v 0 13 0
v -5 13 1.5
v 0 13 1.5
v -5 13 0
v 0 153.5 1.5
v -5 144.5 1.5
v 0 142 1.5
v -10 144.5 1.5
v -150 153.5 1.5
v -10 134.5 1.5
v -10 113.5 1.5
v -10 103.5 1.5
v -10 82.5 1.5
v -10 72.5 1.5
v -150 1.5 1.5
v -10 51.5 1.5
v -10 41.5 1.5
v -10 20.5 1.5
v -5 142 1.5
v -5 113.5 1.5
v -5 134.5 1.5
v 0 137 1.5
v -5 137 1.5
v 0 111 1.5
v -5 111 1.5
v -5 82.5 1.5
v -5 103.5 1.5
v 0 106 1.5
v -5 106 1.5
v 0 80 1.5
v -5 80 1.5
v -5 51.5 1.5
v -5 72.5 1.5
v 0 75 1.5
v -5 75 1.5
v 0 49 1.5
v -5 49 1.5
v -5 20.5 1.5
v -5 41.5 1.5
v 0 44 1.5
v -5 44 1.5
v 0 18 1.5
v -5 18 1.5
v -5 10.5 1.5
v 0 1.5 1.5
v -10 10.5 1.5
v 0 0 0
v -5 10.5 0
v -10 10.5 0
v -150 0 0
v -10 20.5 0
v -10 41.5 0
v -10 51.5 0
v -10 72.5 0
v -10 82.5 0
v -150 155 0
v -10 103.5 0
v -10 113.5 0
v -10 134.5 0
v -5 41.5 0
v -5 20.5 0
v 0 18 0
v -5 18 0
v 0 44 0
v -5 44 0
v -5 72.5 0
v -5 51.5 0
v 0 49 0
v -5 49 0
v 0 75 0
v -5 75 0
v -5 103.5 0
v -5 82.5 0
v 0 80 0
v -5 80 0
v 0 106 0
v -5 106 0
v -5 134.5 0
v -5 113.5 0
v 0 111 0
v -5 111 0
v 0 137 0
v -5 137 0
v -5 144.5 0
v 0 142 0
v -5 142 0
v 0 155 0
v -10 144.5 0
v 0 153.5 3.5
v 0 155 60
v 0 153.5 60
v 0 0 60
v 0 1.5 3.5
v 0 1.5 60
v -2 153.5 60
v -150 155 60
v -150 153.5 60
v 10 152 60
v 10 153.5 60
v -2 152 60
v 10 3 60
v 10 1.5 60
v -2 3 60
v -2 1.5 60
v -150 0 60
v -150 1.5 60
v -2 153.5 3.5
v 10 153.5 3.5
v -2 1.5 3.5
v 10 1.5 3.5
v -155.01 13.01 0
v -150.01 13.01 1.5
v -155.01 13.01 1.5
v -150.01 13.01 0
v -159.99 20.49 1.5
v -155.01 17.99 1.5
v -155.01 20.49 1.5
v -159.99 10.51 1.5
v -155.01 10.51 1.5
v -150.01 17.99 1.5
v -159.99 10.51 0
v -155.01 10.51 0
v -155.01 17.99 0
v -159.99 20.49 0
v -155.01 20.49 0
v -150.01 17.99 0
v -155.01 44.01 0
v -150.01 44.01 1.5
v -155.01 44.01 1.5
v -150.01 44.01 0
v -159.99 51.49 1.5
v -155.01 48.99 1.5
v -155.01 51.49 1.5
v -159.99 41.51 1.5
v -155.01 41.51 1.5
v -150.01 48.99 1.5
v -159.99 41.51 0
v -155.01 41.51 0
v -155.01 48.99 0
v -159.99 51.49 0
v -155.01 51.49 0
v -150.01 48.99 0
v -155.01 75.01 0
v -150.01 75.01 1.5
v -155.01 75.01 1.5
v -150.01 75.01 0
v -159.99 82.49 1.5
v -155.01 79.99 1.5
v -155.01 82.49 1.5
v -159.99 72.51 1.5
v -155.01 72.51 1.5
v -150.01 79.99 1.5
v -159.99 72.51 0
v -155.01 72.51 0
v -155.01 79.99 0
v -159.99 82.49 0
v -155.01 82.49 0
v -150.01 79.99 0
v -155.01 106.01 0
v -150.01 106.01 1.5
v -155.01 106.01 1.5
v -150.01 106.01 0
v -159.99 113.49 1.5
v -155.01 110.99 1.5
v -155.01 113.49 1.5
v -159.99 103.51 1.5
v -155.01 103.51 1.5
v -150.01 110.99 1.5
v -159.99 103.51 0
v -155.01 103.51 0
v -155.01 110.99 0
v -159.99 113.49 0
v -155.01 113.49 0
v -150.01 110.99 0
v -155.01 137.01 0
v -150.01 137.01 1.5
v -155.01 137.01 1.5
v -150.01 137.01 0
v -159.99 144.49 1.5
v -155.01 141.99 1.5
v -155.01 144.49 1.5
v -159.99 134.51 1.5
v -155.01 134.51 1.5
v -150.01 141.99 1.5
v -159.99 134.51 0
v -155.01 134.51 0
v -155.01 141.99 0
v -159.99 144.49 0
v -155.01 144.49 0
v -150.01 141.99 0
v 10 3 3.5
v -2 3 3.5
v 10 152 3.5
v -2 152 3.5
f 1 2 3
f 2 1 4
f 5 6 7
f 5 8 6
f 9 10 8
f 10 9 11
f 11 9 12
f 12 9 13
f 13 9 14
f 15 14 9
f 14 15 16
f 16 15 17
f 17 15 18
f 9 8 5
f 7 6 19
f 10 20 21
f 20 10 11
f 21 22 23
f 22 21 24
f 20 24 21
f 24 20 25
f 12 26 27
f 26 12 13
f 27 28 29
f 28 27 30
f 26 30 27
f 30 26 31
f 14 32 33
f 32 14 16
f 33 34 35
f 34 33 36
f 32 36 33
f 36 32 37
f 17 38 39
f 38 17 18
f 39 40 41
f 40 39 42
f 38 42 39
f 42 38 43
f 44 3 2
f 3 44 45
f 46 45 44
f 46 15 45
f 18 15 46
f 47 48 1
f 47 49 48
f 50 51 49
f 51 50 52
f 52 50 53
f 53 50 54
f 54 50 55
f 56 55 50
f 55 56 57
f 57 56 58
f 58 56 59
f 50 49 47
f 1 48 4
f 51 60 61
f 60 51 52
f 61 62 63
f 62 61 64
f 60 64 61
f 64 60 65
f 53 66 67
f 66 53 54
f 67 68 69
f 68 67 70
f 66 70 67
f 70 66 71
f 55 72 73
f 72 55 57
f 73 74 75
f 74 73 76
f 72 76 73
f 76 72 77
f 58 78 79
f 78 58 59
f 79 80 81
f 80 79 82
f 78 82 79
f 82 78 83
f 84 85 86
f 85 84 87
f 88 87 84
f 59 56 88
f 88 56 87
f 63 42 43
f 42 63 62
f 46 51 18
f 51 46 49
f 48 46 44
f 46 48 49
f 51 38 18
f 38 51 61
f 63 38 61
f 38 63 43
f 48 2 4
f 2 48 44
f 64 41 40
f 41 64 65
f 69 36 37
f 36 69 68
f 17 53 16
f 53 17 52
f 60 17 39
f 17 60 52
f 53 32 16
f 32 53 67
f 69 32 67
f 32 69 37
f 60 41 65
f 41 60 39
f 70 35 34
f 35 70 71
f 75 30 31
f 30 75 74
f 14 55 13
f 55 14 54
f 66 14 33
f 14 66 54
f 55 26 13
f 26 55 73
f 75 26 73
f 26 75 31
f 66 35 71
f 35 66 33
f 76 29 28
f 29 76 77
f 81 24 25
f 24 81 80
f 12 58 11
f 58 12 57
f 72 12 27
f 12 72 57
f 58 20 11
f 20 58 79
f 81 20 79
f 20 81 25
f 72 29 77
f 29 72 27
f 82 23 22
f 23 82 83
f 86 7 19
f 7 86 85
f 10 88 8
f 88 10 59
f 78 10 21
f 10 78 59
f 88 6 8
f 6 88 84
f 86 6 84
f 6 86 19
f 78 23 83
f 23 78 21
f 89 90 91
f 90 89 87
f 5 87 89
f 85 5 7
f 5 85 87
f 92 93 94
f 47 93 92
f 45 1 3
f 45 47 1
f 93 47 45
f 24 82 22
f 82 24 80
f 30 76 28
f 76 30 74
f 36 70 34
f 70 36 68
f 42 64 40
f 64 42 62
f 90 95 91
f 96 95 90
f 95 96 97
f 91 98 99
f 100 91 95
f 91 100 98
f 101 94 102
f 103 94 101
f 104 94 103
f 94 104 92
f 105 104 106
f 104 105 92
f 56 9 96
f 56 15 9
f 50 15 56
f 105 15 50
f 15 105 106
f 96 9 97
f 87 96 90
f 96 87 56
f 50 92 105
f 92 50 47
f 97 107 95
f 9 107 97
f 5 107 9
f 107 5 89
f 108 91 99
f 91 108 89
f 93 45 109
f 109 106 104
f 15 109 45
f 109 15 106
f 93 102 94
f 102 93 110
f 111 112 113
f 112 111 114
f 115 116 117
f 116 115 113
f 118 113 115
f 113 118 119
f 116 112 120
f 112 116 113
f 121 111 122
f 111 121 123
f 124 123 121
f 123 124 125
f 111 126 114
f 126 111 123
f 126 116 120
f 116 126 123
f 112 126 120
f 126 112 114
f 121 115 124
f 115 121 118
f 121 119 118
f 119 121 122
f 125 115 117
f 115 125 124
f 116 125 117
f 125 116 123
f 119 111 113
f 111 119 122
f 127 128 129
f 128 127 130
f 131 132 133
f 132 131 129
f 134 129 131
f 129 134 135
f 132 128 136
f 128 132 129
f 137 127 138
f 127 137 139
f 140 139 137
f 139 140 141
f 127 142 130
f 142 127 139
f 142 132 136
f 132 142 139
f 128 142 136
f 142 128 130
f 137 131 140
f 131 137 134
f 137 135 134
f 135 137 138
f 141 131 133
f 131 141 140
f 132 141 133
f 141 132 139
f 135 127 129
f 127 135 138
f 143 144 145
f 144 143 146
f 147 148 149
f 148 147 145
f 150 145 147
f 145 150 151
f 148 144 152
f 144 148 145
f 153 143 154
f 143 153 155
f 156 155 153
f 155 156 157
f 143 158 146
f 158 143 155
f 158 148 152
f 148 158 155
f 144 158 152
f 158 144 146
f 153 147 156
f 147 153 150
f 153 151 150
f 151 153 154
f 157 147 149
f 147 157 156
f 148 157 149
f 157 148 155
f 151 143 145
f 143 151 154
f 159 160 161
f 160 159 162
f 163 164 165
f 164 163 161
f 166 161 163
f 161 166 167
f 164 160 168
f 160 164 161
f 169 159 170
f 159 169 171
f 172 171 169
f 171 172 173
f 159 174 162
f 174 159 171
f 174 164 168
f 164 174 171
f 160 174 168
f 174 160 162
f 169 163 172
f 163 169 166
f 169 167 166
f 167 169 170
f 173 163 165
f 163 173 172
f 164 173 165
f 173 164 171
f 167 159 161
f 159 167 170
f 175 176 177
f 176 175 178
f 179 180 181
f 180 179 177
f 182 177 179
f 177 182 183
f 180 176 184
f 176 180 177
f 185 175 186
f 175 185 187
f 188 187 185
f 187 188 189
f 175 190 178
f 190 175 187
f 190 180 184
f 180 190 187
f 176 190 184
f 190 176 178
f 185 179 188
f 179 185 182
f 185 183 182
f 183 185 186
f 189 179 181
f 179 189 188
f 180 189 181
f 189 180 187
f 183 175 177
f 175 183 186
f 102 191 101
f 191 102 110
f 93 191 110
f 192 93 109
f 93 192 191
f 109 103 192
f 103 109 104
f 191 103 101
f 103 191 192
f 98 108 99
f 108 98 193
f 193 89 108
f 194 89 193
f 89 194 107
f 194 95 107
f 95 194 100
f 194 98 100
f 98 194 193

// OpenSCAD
$fn = 100;

bottomThickness = 1.5;
wallThickness = 1.5;


screwRadiusM3 = 1.45;
screwRadiusM4 = 1.75;
screwRadiusM3Smooth = 1.6;
smoothRodRadius = 8.2/2;


axisSectionDepth = 40;

boxWidth = 150;
boxDepth = 195 - axisSectionDepth;
boxHeight = 60;

//endBox();
//translate([-boxWidth - 20, 0, 0])
box();

//translate([-boxWidth * 2 - 40, 0, 0])
//otherEndBox();

//motorMount();
//translate([0, 50, 0])
//otherMount();





module box(addConnectFlaps = true) {
    hookWidth = 10;
    hookDepth = 10;
    
    hookCount = 5;
    
    translate([-boxWidth, 0, 0])
    difference() 
    {
        cube([boxWidth, boxDepth, boxHeight]);
        translate([0, wallThickness, bottomThickness])
        cube([boxWidth, boxDepth - wallThickness * 2, boxHeight - bottomThickness]);
        
        for (i=[0:hookCount - 1]) {
            x = boxDepth / hookCount * (i + .5);
            translate([boxWidth - hookWidth, x, 0])
            rotate([0, 0, -90])
            hook(hookWidth, hookDepth + 1, 5, 0);
        }
    }
    
    for (i=[0:hookCount - 1]) {
        x = boxDepth / hookCount * (i + .5);
        translate([-boxWidth - hookWidth, x, 0])
        rotate([0, 0, -90])
        hook(hookWidth, hookDepth, 5);
    }
    
    if (addConnectFlaps) {
        
        overlapWidth = 10;
        overlapVerticalOffset = 2;
        translate([-2, wallThickness, bottomThickness + overlapVerticalOffset]) {
            cube([overlapWidth + 2, wallThickness, boxHeight - bottomThickness - overlapVerticalOffset]);
        
            translate([0, boxDepth - wallThickness * 3, 0])
            cube([overlapWidth + 2, wallThickness, boxHeight - bottomThickness - overlapVerticalOffset]);
        }
    }
}






module endBox() { // boxWidth = 50;
    box(addConnectFlaps=false);
    translate([-wallThickness, 0, 0])
    cube([wallThickness, boxDepth, boxHeight]);
    translate([-boxWidth / 2, 0, 0])
    cube([boxWidth / 2, boxDepth, bottomThickness]);
    
    translate([0, 0, bottomThickness])
    motorMount();
    translate([-3, -axisSectionDepth, 0])
    cube([15 + 3, boxDepth + axisSectionDepth, bottomThickness]);
}



module otherEndBox() {
    difference() {
        box(addConnectFlaps=true);
        translate([-boxWidth * 2, 0, 0])
        cube([boxWidth, boxDepth, boxHeight]);
    }
    translate([-boxWidth, 0, 0])
    cube([wallThickness, boxDepth, boxHeight]);

    
    translate([-boxWidth+3, 0, bottomThickness])
    otherMount();
    translate([-boxWidth, -axisSectionDepth, 0])
    cube([15 + 3, boxDepth + axisSectionDepth, bottomThickness]);
}








module motorMount() {
    thickness = 3;
    motorConnectorHeight = 42;
    
    difference() {
        union() {
            translate([0, -axisSectionDepth, 0])
            rotate([0, 0, 90])
            motorMountPanel(axisSectionDepth, motorConnectorHeight, thickness);
            
            translate([-thickness, -axisSectionDepth, motorConnectorHeight])
            cube([thickness, axisSectionDepth, boxHeight - motorConnectorHeight - bottomThickness]);
        }
        
        translate([-thickness, -axisSectionDepth/2, motorConnectorHeight])
        rotate([0, 90, 0])
        cylinder(r=smoothRodRadius,thickness);
    }
}


module otherMount() {
    thickness = 3;
    motorConnectorHeight = 42;
    threadedRodSmoothRadius = 3.3;
    
    difference() {
        translate([-thickness, -axisSectionDepth, 0])
        cube([thickness, axisSectionDepth, boxHeight]);
        
        translate([-thickness, -axisSectionDepth/2, motorConnectorHeight])
        rotate([0, 90, 0])
        cylinder(r=smoothRodRadius,thickness);
        
        translate([-thickness, -axisSectionDepth/2, motorConnectorHeight / 2])
        rotate([0, 90, 0])
        cylinder(r=threadedRodSmoothRadius, thickness);
    }
    translate([-thickness, -axisSectionDepth, boxHeight - 30])
    cube([1, axisSectionDepth, 30]);
}





module motorMountPanel(width, height, thickness) {
    screwRadius = 1.55;
    holeDistance = 31;

    motorHoleRadius = 12;
    xPadding = (width - (holeDistance + screwRadius * 2))/2;
    yPadding = (height - (holeDistance + screwRadius * 2))/2;

    
    difference() {
        cube([
            width,
            thickness, 
            height
        ]);
        
        translate([xPadding + screwRadius, thickness + 1, yPadding + screwRadius])
        {
            rotate([90, 0, 0]) cylinder(thickness + 2, r=screwRadius, true);

            translate([holeDistance, 0, 0])
            rotate([90, 0, 0]) cylinder(thickness + 2, r=screwRadius, true);
            translate([0, 0, holeDistance])
            rotate([90, 0, 0]) cylinder(thickness + 2, r=screwRadius, true);
            translate([holeDistance, 0, holeDistance])
            rotate([90, 0, 0]) cylinder(thickness + 2, r=screwRadius, true);
                
            translate([holeDistance / 2, 0, holeDistance / 2])
            rotate([90, 0, 0]) cylinder(thickness + 2, r=motorHoleRadius, true);
        }
    }
}












module hook(width, depth, size, margin = 0.01) {
    translate([-size/2 + margin, margin, 0])
    cube([size - margin * 2, depth - margin * 2, bottomThickness]);
    translate([-width/2 + margin, margin, 0])
    cube([width - margin * 2, size - margin * 2, bottomThickness]);
}
